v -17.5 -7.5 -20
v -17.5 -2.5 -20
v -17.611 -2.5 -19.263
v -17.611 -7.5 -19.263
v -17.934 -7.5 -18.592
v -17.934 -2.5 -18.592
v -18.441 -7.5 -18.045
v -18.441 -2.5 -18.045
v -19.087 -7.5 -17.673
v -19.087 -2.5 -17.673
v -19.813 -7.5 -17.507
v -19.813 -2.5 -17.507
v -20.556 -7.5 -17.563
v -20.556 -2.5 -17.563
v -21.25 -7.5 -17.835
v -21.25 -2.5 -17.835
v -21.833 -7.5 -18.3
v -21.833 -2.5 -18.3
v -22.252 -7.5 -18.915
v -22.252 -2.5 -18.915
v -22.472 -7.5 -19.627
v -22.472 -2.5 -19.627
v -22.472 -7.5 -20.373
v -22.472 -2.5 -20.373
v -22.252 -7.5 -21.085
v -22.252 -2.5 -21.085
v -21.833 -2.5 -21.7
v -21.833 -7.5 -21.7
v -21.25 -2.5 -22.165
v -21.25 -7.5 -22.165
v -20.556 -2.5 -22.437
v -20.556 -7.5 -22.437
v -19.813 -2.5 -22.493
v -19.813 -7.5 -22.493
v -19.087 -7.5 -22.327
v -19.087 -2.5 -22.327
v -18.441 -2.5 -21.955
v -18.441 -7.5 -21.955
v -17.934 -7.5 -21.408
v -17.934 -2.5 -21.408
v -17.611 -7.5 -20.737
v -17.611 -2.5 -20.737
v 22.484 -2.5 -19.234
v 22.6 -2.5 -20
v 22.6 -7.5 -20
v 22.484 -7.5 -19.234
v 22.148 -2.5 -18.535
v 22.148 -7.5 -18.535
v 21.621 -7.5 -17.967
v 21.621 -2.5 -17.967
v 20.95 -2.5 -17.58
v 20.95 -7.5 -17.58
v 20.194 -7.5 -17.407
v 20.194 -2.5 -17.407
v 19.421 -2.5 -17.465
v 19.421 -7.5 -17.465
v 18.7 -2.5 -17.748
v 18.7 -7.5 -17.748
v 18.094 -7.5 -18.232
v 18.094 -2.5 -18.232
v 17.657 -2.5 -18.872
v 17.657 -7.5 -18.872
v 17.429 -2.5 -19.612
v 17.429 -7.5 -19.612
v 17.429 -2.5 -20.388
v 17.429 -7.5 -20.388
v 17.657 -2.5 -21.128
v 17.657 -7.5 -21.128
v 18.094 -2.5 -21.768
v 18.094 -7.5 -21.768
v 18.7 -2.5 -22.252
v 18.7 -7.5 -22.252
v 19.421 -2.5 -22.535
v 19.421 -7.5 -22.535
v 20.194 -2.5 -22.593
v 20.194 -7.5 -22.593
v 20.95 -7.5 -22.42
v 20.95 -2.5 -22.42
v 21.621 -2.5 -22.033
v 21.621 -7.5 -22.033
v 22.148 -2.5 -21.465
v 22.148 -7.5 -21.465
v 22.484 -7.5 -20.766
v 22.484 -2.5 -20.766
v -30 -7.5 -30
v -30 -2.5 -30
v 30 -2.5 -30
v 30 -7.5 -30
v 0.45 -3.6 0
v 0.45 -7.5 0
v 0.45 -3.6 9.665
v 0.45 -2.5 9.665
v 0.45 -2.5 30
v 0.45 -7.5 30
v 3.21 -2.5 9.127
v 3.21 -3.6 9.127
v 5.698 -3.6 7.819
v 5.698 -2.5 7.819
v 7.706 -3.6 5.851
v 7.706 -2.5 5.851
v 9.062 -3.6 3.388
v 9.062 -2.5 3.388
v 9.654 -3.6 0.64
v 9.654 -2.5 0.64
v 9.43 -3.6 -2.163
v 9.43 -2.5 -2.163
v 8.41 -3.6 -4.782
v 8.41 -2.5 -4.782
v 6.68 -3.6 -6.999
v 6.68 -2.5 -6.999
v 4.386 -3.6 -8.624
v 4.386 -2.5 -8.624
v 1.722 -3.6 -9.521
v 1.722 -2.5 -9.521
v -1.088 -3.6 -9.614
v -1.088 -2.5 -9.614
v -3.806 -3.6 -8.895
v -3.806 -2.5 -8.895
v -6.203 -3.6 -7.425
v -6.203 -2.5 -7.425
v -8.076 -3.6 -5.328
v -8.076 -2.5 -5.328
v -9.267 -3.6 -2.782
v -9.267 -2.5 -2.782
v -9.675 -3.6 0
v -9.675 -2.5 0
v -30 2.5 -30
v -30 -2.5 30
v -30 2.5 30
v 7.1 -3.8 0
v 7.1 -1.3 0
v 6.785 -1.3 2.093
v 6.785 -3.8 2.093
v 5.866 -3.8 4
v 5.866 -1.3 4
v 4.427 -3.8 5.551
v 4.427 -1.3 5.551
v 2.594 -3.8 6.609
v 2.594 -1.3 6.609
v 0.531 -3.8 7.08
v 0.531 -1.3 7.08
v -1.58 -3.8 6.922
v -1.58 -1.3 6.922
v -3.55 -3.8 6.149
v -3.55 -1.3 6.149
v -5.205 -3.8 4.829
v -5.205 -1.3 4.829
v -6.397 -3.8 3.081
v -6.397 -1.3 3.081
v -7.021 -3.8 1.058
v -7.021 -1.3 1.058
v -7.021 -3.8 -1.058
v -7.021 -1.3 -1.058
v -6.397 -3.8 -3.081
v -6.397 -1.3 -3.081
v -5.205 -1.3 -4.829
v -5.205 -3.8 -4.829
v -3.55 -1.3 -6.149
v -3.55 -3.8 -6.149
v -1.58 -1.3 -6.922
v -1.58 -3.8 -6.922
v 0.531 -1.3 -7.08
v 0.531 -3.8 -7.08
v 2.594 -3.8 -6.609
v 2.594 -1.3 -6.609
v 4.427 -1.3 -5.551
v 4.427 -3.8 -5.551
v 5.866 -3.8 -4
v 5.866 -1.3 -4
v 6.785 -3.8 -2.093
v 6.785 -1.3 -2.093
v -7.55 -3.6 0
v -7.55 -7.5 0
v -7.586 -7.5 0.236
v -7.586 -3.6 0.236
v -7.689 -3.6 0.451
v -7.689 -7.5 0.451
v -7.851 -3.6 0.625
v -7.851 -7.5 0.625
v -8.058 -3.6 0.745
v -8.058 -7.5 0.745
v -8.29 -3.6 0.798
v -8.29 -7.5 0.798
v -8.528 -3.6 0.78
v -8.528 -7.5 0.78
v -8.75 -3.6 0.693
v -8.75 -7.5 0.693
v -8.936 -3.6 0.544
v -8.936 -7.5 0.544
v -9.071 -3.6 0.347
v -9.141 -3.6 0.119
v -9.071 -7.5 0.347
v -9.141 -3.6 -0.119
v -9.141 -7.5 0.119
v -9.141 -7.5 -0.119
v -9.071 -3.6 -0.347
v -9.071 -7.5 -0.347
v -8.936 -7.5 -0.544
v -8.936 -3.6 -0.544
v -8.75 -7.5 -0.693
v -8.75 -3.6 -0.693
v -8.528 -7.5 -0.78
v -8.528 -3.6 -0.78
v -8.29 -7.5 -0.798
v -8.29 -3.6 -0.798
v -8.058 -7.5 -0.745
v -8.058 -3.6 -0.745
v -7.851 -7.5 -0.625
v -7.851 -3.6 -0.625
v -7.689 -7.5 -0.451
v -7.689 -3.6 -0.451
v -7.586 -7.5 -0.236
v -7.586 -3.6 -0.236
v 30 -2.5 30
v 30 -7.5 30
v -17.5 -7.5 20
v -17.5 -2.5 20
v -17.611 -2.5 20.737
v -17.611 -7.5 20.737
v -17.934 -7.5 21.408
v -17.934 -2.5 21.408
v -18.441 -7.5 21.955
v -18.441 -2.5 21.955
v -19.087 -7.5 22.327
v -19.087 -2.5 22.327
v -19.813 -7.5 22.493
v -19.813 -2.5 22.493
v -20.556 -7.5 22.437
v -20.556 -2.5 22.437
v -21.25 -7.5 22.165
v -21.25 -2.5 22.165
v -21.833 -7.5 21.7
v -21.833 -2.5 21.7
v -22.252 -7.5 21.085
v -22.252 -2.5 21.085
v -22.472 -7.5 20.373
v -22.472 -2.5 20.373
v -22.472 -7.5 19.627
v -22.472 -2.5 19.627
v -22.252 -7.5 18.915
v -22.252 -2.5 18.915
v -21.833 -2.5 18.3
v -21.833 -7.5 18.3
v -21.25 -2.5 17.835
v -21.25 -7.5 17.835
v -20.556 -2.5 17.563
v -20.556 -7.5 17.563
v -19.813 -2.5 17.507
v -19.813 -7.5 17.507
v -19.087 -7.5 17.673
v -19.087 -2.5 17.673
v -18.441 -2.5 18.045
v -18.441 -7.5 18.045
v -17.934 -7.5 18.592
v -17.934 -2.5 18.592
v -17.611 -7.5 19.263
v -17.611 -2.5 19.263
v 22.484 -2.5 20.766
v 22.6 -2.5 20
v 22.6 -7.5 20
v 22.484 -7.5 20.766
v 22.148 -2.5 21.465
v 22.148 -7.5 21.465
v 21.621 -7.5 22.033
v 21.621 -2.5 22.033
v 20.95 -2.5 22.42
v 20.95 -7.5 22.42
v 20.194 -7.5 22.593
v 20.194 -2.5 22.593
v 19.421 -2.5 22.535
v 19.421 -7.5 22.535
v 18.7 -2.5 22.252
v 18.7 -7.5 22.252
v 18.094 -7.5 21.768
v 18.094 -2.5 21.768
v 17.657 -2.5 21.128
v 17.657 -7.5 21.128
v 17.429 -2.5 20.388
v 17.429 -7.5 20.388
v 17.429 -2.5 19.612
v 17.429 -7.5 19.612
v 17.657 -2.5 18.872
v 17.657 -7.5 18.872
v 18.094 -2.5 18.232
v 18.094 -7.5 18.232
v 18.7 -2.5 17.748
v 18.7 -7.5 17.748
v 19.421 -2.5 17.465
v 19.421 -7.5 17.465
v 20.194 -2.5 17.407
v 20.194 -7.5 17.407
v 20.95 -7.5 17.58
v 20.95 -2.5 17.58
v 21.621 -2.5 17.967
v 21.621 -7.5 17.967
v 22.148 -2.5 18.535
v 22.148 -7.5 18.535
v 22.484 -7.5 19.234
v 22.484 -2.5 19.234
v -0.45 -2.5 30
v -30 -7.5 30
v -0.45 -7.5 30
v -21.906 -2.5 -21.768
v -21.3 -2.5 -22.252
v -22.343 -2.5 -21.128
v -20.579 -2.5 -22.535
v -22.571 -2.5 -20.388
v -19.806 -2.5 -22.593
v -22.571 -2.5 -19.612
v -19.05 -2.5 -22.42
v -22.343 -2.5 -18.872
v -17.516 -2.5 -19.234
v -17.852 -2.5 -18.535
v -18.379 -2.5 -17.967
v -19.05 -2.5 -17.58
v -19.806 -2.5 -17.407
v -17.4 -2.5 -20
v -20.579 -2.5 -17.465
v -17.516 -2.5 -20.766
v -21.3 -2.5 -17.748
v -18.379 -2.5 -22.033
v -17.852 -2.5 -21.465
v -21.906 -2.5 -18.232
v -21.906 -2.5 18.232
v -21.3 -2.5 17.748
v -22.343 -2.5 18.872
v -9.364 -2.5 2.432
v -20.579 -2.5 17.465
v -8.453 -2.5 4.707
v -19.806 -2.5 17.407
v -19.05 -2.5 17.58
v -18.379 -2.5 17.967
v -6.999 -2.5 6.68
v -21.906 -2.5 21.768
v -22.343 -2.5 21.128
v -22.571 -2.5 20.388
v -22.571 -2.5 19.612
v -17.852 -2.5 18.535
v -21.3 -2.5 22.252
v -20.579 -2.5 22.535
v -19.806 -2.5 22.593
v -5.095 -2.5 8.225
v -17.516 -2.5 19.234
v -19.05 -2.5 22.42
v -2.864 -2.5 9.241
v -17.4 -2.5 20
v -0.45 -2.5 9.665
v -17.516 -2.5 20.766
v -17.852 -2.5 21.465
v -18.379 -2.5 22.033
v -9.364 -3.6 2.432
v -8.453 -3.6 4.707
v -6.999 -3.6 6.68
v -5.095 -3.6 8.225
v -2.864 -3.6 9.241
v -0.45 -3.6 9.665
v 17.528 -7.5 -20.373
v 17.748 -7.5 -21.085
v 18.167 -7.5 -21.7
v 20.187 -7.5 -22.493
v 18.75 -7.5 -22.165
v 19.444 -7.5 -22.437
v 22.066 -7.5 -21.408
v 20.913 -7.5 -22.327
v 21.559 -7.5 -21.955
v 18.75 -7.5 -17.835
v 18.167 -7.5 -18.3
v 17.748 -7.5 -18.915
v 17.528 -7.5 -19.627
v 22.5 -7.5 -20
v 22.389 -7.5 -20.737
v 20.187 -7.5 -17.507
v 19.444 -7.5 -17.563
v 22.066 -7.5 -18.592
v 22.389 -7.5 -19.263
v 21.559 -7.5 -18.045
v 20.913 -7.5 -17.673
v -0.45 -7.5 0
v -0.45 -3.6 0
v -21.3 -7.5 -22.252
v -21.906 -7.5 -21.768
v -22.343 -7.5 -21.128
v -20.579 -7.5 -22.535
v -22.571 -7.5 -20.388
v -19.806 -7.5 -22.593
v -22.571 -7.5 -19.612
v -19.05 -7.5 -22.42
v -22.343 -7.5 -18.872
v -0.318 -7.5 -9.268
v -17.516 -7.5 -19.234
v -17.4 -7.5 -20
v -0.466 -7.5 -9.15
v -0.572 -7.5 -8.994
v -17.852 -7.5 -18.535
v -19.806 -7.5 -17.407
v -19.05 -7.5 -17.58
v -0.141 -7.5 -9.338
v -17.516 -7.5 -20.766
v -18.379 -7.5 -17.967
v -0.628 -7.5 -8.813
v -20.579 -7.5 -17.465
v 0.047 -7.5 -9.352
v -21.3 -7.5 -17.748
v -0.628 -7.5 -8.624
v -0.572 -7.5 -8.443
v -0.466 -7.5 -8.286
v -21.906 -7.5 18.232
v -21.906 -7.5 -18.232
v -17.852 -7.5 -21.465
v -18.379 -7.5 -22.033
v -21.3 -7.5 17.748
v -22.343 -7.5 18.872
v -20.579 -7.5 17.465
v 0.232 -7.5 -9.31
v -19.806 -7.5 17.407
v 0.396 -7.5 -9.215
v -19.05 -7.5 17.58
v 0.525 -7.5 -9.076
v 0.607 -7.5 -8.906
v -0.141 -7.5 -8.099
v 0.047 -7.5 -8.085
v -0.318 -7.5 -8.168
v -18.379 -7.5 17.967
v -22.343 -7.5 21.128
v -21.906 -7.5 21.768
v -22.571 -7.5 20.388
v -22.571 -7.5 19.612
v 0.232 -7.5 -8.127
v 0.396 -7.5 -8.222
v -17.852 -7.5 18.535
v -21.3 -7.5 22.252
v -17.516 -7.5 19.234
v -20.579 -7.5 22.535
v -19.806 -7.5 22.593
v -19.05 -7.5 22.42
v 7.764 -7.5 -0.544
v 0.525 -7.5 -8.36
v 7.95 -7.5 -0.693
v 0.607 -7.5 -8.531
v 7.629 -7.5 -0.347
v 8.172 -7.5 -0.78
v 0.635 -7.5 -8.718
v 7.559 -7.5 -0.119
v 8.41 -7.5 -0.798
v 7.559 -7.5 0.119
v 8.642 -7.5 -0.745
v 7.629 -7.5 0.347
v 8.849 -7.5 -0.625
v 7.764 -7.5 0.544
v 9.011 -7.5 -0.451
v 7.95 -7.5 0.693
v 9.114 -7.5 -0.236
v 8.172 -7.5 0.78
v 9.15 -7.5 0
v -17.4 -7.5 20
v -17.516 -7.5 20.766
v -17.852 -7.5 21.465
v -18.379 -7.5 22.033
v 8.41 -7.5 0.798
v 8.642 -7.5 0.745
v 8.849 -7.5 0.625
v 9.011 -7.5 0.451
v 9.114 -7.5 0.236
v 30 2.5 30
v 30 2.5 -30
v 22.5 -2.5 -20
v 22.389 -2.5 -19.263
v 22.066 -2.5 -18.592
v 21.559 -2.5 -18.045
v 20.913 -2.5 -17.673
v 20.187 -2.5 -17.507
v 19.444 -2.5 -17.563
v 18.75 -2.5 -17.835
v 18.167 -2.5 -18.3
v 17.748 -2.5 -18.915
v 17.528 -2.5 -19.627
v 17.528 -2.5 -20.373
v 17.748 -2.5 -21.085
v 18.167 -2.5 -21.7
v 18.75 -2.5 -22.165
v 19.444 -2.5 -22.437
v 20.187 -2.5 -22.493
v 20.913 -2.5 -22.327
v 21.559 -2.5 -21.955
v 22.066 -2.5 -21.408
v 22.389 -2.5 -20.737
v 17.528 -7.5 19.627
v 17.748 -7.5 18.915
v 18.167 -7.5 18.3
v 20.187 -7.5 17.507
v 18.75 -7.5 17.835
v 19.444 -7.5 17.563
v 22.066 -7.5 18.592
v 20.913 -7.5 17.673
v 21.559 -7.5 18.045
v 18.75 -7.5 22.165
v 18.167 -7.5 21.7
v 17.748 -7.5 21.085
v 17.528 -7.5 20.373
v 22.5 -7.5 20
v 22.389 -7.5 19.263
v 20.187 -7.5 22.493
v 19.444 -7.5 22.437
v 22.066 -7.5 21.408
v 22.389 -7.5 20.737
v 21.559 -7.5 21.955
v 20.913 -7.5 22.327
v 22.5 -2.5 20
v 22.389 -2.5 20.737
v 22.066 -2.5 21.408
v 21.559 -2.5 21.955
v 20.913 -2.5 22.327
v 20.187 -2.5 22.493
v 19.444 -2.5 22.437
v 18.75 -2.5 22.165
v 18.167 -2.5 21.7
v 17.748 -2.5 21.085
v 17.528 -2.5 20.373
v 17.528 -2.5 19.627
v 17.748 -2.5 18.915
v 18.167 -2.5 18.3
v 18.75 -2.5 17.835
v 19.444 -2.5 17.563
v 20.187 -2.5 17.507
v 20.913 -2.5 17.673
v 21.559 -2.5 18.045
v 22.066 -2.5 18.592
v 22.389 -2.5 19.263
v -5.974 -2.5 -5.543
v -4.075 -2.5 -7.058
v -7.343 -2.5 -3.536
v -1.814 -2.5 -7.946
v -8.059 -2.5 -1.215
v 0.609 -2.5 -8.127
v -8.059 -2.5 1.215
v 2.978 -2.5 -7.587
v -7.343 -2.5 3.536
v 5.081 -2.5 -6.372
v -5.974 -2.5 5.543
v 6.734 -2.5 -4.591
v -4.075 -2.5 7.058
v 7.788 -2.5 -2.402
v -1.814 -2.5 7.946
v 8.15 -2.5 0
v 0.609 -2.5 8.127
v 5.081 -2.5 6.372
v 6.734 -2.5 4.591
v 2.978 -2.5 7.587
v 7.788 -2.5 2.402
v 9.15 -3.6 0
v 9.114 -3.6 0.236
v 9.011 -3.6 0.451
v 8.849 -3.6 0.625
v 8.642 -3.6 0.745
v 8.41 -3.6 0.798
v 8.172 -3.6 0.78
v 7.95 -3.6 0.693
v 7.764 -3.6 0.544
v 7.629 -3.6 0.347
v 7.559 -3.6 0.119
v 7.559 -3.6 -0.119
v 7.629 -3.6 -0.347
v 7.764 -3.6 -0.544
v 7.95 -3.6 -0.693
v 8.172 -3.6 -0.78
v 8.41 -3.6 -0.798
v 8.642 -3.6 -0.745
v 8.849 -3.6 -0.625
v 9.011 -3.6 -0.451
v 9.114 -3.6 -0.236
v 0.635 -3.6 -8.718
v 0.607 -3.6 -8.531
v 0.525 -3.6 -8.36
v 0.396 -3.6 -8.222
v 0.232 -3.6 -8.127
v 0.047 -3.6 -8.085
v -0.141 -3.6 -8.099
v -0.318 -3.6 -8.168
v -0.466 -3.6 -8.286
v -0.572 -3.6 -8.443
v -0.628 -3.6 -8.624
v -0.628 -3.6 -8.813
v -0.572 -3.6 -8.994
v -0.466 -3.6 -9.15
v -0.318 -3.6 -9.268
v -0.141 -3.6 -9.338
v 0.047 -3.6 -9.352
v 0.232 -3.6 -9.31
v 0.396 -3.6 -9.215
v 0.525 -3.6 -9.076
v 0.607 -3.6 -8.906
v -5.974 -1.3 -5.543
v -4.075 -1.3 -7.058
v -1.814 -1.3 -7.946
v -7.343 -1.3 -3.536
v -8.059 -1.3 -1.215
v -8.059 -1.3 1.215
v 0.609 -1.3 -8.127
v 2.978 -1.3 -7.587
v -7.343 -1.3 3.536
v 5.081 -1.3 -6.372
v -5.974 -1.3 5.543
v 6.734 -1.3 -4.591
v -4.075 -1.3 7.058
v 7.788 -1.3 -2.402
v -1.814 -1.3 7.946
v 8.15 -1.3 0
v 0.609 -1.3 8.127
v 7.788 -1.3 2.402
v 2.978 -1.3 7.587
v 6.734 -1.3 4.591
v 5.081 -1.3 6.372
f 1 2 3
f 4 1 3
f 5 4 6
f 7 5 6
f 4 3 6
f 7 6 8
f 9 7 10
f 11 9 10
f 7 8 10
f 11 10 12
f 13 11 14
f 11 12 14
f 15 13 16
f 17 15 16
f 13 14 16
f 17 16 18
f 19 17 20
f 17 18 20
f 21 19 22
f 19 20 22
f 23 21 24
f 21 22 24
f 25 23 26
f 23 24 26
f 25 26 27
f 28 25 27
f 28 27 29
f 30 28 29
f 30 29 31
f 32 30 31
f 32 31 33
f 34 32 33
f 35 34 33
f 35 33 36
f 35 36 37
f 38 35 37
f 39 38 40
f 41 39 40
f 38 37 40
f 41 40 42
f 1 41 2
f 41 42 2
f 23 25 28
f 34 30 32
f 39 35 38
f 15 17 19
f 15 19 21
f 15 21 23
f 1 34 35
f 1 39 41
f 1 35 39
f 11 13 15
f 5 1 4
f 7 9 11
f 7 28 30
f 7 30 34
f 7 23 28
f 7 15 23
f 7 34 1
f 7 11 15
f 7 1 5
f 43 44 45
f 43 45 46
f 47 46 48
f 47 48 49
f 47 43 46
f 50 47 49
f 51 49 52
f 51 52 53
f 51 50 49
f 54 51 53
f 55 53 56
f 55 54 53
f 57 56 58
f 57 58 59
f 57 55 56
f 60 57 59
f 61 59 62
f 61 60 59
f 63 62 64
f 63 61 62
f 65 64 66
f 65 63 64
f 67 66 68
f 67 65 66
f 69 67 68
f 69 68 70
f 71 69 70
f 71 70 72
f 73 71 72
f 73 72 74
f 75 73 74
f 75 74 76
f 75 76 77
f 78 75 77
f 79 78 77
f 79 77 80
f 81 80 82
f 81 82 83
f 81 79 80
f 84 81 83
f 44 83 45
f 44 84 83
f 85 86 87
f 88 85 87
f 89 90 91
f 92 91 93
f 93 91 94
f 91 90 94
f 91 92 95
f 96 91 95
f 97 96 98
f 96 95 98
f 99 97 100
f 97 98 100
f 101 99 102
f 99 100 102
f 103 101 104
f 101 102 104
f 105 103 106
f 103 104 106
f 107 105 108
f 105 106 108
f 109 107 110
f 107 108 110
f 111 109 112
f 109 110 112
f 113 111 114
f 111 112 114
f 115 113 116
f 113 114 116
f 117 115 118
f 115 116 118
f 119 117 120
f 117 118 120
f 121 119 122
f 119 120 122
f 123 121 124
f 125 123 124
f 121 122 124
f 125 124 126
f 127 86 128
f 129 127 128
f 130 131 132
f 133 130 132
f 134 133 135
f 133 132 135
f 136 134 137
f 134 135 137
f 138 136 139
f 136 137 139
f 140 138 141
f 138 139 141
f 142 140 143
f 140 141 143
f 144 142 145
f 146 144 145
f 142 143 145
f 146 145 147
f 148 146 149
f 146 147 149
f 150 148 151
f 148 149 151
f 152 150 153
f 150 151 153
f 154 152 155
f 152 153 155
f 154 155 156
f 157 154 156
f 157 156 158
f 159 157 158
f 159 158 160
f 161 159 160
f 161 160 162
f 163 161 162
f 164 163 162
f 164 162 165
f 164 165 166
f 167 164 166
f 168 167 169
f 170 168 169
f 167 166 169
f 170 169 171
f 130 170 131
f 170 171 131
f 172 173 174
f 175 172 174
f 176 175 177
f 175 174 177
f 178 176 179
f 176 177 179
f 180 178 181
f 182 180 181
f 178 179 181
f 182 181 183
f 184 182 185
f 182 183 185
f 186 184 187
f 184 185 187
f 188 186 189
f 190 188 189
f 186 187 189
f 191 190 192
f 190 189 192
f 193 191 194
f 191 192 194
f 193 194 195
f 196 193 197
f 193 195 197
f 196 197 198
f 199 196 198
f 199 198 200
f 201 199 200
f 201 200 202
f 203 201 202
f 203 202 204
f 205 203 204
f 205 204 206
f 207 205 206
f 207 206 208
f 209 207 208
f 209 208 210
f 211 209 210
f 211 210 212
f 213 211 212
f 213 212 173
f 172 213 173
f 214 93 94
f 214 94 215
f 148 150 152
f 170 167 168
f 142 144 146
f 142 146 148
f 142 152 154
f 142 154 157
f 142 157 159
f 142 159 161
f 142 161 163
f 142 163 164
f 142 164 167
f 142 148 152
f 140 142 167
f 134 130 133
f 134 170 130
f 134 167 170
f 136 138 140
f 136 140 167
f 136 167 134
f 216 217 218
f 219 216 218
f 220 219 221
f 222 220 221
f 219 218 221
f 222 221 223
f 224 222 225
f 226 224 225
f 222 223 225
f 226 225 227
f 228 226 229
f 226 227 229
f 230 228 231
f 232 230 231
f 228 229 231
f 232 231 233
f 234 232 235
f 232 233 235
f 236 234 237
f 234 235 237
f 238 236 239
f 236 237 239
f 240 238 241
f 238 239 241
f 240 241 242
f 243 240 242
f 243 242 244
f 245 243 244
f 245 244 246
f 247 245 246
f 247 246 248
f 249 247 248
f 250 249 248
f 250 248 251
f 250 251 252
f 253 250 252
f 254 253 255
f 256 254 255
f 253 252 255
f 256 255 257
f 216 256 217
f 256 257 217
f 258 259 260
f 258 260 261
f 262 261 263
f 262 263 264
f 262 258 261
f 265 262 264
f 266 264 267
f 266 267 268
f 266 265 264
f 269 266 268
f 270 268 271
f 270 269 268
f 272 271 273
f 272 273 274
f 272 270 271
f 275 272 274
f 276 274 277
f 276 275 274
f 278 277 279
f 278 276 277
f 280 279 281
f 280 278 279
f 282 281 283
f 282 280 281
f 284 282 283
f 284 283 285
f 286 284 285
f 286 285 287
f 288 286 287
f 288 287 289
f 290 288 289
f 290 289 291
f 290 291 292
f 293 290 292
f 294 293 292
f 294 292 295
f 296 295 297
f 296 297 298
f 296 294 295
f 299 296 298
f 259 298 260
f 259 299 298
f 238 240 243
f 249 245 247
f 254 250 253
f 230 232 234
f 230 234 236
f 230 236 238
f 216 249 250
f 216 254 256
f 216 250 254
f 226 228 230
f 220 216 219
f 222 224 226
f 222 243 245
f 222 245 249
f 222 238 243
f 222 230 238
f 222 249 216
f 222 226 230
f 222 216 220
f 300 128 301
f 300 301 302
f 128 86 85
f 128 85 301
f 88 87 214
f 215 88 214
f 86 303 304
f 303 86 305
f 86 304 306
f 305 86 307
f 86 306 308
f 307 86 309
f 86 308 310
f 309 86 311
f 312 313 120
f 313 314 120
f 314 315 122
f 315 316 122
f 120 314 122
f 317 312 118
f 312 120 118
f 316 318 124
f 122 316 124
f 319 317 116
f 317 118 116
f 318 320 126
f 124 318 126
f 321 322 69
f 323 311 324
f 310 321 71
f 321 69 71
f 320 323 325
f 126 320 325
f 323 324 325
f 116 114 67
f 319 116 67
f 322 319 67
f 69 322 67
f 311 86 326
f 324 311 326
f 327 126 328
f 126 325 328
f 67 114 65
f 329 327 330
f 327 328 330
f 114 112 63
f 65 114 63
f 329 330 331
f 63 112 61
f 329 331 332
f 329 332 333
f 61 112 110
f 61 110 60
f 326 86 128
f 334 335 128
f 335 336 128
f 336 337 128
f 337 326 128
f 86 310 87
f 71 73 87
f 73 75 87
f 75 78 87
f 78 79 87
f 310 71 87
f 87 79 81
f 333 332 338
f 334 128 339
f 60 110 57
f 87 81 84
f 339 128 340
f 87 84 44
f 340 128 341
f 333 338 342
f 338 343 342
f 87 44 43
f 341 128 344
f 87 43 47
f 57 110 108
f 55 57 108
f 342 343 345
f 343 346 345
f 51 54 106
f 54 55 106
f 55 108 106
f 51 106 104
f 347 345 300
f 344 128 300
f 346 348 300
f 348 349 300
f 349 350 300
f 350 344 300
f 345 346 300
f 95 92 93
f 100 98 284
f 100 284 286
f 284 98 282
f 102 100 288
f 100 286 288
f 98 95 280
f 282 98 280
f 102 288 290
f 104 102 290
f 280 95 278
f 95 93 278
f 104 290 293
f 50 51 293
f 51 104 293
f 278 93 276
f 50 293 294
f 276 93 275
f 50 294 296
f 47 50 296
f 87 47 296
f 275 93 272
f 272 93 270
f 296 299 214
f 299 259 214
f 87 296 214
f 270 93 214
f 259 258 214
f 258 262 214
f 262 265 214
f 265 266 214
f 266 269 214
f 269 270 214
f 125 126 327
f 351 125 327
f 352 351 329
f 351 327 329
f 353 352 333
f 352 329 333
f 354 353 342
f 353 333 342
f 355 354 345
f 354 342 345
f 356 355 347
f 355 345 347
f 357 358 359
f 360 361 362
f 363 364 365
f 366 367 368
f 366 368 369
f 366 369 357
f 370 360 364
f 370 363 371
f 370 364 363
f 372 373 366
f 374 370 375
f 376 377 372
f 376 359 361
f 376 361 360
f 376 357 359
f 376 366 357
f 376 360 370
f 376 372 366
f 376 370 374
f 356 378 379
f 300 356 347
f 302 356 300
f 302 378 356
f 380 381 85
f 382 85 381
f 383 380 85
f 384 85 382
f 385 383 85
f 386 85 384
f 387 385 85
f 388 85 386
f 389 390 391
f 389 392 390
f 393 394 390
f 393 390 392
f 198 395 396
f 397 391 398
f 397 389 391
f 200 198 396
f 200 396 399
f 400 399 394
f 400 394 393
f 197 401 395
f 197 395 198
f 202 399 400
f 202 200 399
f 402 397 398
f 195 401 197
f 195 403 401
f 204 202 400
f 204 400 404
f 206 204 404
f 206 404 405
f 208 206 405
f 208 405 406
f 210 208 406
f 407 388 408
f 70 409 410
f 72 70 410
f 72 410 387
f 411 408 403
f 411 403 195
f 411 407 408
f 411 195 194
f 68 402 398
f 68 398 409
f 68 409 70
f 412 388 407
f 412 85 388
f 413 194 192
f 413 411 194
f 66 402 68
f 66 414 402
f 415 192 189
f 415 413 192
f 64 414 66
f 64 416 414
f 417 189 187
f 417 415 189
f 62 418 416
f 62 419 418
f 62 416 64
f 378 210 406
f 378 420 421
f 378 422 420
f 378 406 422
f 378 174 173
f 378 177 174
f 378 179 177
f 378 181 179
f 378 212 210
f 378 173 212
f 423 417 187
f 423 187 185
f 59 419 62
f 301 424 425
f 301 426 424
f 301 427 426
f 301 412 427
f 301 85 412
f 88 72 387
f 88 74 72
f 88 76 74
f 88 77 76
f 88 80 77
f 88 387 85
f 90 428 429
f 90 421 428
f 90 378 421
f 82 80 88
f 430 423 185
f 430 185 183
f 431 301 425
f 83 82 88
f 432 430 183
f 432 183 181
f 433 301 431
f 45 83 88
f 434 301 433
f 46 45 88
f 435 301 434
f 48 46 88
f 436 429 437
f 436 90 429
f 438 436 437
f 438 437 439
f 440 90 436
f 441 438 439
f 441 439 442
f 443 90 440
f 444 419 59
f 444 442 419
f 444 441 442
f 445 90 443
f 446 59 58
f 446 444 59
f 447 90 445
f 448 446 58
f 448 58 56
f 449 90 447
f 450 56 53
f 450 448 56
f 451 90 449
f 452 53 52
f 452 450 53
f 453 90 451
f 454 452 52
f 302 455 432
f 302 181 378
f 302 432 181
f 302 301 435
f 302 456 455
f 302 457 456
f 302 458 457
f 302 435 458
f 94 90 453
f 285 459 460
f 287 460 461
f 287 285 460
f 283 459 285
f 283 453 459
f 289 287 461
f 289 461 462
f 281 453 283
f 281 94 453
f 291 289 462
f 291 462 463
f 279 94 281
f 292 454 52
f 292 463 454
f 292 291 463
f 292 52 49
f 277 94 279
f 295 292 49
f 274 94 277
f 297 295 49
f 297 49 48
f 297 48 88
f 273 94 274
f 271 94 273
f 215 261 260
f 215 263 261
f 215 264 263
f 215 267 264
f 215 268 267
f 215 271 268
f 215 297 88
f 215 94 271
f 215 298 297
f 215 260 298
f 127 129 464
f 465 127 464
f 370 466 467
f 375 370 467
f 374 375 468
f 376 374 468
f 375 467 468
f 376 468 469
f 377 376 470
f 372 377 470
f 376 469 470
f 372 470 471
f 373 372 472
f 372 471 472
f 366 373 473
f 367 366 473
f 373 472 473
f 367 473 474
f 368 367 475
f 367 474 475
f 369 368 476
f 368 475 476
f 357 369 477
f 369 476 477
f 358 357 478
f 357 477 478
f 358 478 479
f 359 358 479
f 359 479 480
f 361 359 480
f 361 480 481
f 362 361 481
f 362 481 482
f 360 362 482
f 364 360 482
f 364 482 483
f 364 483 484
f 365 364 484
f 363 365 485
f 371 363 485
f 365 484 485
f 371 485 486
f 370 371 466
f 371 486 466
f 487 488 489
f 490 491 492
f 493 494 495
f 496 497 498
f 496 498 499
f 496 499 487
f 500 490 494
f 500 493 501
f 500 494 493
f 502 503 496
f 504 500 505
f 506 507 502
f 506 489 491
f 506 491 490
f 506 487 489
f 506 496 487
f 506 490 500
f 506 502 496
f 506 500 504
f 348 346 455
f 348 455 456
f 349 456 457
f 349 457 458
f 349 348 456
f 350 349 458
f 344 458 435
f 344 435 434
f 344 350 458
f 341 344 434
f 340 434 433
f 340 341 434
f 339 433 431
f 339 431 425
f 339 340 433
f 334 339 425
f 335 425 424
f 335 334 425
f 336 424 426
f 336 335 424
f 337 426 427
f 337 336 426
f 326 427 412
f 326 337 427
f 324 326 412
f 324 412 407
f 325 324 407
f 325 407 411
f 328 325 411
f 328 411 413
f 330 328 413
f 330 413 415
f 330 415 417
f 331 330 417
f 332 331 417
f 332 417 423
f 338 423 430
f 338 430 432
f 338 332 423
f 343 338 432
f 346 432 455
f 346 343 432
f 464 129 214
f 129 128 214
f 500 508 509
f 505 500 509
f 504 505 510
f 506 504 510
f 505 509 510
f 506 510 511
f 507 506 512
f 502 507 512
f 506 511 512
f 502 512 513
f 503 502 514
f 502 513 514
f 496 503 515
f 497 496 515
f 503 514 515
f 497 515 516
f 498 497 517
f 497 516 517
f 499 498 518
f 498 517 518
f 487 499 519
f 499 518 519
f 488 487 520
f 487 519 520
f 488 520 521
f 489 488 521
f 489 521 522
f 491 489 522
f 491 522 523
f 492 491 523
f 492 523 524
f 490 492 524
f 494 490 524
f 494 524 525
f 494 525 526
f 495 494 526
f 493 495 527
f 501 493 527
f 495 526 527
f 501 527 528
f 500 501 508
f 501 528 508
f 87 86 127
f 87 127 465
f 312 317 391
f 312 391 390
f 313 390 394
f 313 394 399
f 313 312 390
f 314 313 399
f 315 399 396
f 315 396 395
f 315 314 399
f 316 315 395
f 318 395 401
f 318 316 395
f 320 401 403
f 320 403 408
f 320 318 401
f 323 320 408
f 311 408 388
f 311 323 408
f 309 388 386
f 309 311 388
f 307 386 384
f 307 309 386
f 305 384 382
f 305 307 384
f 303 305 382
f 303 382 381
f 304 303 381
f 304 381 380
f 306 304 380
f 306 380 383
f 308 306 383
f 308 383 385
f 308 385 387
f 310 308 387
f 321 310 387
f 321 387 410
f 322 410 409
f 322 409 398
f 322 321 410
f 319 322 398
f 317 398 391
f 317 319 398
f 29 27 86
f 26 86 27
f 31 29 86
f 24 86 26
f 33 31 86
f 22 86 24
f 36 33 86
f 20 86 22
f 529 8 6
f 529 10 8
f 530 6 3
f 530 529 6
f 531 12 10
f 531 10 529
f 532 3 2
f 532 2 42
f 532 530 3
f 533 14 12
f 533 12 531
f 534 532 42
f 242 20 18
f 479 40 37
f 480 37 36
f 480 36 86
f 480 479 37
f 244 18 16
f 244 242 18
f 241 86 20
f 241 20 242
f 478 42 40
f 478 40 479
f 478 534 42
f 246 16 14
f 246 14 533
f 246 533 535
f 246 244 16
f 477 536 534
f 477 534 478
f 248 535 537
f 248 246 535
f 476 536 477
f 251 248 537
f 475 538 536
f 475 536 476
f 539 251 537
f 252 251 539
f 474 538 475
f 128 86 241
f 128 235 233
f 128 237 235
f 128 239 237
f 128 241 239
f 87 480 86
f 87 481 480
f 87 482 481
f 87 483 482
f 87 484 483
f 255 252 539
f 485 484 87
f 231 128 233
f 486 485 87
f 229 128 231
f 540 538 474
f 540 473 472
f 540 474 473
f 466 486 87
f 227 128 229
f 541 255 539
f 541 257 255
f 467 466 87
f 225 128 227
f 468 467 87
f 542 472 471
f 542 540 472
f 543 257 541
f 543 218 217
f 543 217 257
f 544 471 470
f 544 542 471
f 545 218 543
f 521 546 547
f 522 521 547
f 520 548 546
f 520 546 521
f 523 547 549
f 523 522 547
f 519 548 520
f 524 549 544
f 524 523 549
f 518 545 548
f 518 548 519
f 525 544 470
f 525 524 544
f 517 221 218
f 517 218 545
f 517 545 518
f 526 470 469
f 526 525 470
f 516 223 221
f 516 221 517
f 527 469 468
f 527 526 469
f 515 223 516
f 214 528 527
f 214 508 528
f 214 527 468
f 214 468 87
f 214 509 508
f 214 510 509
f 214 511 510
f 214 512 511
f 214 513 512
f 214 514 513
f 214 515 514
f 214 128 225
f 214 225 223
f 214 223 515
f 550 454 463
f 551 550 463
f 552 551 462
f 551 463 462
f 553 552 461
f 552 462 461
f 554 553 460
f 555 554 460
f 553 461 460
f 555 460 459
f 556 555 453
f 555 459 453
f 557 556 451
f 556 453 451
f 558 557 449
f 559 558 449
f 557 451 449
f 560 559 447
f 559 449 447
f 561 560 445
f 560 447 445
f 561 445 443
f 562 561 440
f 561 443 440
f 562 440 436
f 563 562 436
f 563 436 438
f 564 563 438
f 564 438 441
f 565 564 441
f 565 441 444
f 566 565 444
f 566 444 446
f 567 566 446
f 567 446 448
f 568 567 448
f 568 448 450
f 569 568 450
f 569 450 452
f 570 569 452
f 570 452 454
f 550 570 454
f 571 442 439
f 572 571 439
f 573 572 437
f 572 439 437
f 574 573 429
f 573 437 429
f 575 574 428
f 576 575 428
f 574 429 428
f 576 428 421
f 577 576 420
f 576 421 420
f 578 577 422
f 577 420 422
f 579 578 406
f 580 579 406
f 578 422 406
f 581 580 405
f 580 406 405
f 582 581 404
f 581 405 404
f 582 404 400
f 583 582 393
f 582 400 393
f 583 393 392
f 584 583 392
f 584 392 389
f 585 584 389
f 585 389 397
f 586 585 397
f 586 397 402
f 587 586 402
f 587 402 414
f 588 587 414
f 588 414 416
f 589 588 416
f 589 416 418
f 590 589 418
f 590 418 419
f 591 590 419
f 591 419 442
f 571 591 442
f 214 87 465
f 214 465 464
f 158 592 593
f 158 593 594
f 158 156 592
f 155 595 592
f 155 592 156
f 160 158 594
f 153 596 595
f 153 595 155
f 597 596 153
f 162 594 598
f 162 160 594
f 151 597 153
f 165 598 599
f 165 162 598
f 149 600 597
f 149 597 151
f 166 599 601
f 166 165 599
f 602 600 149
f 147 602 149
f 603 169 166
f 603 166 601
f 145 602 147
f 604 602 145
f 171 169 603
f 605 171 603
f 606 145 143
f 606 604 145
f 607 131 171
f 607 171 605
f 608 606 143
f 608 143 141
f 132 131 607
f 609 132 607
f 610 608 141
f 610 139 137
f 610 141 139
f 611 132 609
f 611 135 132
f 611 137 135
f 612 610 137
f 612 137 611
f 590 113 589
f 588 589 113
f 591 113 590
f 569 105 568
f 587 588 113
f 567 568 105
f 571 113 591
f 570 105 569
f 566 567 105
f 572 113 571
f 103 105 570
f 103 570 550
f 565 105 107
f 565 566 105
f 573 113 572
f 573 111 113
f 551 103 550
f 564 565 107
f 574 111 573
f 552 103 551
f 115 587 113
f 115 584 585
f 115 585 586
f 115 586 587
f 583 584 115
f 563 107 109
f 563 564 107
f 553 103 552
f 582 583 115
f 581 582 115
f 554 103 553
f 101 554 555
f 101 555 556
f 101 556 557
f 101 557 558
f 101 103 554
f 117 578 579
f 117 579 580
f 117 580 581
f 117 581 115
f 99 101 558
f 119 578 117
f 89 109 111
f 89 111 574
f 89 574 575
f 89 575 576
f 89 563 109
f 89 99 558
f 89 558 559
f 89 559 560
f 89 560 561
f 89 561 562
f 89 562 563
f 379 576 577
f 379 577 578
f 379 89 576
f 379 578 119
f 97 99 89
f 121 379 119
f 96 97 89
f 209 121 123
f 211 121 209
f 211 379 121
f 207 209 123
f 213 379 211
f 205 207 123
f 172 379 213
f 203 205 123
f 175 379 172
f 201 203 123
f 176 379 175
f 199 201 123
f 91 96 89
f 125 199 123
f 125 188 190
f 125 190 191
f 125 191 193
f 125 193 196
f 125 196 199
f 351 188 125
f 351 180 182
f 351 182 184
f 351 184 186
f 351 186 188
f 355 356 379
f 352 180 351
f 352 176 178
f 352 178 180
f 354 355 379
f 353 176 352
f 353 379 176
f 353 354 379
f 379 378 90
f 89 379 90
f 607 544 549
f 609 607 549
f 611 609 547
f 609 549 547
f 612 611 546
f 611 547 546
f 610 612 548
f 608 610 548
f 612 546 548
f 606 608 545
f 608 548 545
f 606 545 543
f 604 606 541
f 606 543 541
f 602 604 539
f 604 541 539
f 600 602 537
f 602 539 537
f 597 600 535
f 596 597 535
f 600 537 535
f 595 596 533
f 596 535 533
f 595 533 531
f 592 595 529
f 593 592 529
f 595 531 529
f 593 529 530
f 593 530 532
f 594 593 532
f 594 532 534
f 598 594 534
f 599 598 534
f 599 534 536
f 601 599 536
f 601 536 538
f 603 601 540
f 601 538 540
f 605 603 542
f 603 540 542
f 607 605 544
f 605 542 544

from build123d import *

# Parameters (mm, degrees)
F0_W      = 60
F0_H      = 60
F1_DEPTH  = 2.5
F2_R      = 8.15
F3_DEPTH  = 1.2
F4_R      = 7.1
F5_DEPTH  = 2.5
F6_R      = 2.5
F7_DEPTH  = 5
F8_W      = 60
F8_H      = 60
F8_R      = 2.6
F9_DEPTH  = 5
F10_R     = 9.675
F11_DEPTH = 1.1
F12_W     = 0.9
F12_H     = 32.9937078059
F13_DEPTH = 25
F14_R     = 0.8
F15_DEPTH = 25
F16_R     = 0.6352054313
F17_DEPTH = 25


with BuildPart() as f1:
    # F0 (on Front) → F1 (new body, symmetric)
    with BuildSketch(Plane.XZ):
        Rectangle(F0_W, F0_H)
    extrude(amount=F1_DEPTH, both=True)

    # F2 (on face) → F3 (cut)
    with BuildSketch(Plane.XZ.offset(2.5)):
        Circle(F2_R)
    extrude(amount=-F3_DEPTH, mode=Mode.SUBTRACT)

    # F4 (on face) → F5 (join)
    with BuildSketch(Plane.XZ.offset(1.3)):
        Circle(F4_R)
    extrude(amount=F5_DEPTH)

    # F6 (on face) → F7 (join)
    with BuildSketch(Plane.XZ.offset(2.5)):
        with Locations((-20, 20)):
            Circle(F6_R)
        with Locations((20, 20)):
            Circle(F6_R)
        with Locations((20, -20)):
            Circle(F6_R)
        with Locations((-20, -20)):
            Circle(F6_R)
    extrude(amount=F7_DEPTH)


with BuildPart() as f9:
    # F8 (on face) → F9 (new body)
    with BuildSketch(Plane.XZ.offset(2.5)):
        Rectangle(F8_W, F8_H)
        with Locations((-20, -20)):
            Circle(F8_R, mode=Mode.SUBTRACT)
        with Locations((20, -20)):
            Circle(F8_R, mode=Mode.SUBTRACT)
        with Locations((-20, 20)):
            Circle(F8_R, mode=Mode.SUBTRACT)
        with Locations((20, 20)):
            Circle(F8_R, mode=Mode.SUBTRACT)
    extrude(amount=F9_DEPTH)

    # F10 (on face) → F11 (cut)
    with BuildSketch(Plane(origin=(0, -2.5, 0), x_dir=(-1, 0, 0), z_dir=(0, 1, 0))):
        Circle(F10_R)
    extrude(amount=-F11_DEPTH, mode=Mode.SUBTRACT)

    # F12 (on face) → F13 (cut)
    with BuildSketch(Plane.XZ.offset(7.5)):
        with Locations((0, 16.4968539029)):
            Rectangle(F12_W, F12_H)
    extrude(amount=-F13_DEPTH, mode=Mode.SUBTRACT)

    # F14 (on face) → F15 (cut)
    with BuildSketch(Plane.XZ.offset(7.5)):
        with Locations((-8.35, 0)):
            Circle(F14_R)
        with Locations((8.35, 0)):
            Circle(F14_R)
    extrude(amount=-F15_DEPTH, mode=Mode.SUBTRACT)

    # F16 (on face) → F17 (cut)
    with BuildSketch(Plane.XZ.offset(7.5)):
        with Locations((0, -8.7182717398)):
            Circle(F16_R)
    extrude(amount=-F17_DEPTH, mode=Mode.SUBTRACT)


solid = Compound([f1.part, f9.part])
